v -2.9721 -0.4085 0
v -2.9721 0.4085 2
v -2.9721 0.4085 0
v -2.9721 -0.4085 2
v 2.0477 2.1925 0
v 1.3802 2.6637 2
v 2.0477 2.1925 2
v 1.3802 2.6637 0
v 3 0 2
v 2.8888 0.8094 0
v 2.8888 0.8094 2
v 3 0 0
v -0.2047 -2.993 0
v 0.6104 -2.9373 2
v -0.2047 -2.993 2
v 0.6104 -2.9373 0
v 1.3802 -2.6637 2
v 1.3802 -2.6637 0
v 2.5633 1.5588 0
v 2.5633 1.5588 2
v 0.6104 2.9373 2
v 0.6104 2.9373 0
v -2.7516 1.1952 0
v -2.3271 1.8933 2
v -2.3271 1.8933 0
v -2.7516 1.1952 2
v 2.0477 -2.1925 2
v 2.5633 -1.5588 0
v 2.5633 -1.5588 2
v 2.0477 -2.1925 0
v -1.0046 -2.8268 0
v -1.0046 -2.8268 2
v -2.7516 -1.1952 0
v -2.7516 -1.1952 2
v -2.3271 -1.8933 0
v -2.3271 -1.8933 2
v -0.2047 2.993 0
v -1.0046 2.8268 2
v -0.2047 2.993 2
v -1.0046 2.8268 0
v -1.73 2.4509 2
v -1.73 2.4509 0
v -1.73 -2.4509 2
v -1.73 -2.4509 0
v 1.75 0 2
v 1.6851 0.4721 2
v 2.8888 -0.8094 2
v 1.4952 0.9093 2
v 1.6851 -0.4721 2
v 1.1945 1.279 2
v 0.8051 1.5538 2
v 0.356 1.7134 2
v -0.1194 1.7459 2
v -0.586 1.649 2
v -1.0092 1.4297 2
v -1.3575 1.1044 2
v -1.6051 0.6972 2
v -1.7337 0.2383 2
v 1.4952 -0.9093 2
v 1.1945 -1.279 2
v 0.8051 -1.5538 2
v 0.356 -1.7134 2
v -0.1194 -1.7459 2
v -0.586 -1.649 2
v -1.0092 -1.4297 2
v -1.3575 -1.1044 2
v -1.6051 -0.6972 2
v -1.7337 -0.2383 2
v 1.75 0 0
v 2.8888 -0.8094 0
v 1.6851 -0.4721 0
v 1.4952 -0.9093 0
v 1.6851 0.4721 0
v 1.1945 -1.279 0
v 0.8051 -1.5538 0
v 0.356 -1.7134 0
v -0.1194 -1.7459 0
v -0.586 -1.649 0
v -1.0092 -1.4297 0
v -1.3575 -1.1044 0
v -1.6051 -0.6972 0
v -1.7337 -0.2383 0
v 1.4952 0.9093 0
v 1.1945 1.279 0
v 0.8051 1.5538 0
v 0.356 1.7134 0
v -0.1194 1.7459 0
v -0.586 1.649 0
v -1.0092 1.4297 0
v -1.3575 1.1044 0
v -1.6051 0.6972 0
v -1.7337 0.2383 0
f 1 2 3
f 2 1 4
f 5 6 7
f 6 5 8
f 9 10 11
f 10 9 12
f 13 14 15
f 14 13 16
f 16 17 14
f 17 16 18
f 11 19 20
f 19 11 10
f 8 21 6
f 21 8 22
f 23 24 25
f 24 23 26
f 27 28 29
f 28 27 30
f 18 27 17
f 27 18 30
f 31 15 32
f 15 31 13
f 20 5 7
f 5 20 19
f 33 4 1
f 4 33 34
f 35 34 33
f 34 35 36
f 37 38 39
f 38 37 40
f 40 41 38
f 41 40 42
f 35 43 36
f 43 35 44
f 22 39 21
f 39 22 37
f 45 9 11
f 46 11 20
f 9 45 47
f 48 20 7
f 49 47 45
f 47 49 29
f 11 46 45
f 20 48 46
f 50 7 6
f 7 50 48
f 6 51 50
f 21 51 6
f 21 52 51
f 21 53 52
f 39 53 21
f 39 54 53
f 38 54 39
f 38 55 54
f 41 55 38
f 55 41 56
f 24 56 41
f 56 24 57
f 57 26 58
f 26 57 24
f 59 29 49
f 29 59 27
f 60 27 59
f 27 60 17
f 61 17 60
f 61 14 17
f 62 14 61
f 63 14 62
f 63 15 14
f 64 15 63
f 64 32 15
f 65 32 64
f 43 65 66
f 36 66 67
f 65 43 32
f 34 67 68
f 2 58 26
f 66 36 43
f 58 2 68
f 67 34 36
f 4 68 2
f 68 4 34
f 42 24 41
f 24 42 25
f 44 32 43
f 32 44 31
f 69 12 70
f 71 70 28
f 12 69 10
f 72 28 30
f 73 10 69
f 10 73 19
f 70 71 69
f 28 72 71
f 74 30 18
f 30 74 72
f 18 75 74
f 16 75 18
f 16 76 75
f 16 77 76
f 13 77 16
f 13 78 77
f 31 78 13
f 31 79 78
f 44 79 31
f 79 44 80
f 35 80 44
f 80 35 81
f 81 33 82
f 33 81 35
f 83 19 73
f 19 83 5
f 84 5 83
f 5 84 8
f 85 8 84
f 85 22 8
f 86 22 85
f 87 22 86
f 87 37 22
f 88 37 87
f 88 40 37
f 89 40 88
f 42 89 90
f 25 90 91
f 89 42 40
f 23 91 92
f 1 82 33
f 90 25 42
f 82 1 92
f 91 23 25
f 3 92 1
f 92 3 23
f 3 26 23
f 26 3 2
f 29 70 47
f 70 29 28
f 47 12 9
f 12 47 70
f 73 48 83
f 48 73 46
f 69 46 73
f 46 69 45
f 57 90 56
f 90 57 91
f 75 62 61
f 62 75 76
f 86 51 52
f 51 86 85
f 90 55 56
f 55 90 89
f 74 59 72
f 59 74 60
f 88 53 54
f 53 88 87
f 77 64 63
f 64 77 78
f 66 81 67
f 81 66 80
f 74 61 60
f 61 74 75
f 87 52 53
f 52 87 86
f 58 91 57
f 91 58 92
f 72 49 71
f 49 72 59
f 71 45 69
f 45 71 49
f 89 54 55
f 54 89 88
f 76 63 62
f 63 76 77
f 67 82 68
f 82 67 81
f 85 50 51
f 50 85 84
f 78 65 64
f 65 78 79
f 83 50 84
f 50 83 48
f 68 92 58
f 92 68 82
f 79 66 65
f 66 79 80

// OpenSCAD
$fn=23;

if (0)
difference()
{
	union()
	{
		cylinder(d=5, 5);
		
		translate([0, 0, 5])
		cylinder(d=3.0, 2);
	}

		cylinder(d=2.0, 10);
}

if (1)
difference()
{
	cylinder(d=6, 2);
	
	cylinder(d=3.5, 2);
}
